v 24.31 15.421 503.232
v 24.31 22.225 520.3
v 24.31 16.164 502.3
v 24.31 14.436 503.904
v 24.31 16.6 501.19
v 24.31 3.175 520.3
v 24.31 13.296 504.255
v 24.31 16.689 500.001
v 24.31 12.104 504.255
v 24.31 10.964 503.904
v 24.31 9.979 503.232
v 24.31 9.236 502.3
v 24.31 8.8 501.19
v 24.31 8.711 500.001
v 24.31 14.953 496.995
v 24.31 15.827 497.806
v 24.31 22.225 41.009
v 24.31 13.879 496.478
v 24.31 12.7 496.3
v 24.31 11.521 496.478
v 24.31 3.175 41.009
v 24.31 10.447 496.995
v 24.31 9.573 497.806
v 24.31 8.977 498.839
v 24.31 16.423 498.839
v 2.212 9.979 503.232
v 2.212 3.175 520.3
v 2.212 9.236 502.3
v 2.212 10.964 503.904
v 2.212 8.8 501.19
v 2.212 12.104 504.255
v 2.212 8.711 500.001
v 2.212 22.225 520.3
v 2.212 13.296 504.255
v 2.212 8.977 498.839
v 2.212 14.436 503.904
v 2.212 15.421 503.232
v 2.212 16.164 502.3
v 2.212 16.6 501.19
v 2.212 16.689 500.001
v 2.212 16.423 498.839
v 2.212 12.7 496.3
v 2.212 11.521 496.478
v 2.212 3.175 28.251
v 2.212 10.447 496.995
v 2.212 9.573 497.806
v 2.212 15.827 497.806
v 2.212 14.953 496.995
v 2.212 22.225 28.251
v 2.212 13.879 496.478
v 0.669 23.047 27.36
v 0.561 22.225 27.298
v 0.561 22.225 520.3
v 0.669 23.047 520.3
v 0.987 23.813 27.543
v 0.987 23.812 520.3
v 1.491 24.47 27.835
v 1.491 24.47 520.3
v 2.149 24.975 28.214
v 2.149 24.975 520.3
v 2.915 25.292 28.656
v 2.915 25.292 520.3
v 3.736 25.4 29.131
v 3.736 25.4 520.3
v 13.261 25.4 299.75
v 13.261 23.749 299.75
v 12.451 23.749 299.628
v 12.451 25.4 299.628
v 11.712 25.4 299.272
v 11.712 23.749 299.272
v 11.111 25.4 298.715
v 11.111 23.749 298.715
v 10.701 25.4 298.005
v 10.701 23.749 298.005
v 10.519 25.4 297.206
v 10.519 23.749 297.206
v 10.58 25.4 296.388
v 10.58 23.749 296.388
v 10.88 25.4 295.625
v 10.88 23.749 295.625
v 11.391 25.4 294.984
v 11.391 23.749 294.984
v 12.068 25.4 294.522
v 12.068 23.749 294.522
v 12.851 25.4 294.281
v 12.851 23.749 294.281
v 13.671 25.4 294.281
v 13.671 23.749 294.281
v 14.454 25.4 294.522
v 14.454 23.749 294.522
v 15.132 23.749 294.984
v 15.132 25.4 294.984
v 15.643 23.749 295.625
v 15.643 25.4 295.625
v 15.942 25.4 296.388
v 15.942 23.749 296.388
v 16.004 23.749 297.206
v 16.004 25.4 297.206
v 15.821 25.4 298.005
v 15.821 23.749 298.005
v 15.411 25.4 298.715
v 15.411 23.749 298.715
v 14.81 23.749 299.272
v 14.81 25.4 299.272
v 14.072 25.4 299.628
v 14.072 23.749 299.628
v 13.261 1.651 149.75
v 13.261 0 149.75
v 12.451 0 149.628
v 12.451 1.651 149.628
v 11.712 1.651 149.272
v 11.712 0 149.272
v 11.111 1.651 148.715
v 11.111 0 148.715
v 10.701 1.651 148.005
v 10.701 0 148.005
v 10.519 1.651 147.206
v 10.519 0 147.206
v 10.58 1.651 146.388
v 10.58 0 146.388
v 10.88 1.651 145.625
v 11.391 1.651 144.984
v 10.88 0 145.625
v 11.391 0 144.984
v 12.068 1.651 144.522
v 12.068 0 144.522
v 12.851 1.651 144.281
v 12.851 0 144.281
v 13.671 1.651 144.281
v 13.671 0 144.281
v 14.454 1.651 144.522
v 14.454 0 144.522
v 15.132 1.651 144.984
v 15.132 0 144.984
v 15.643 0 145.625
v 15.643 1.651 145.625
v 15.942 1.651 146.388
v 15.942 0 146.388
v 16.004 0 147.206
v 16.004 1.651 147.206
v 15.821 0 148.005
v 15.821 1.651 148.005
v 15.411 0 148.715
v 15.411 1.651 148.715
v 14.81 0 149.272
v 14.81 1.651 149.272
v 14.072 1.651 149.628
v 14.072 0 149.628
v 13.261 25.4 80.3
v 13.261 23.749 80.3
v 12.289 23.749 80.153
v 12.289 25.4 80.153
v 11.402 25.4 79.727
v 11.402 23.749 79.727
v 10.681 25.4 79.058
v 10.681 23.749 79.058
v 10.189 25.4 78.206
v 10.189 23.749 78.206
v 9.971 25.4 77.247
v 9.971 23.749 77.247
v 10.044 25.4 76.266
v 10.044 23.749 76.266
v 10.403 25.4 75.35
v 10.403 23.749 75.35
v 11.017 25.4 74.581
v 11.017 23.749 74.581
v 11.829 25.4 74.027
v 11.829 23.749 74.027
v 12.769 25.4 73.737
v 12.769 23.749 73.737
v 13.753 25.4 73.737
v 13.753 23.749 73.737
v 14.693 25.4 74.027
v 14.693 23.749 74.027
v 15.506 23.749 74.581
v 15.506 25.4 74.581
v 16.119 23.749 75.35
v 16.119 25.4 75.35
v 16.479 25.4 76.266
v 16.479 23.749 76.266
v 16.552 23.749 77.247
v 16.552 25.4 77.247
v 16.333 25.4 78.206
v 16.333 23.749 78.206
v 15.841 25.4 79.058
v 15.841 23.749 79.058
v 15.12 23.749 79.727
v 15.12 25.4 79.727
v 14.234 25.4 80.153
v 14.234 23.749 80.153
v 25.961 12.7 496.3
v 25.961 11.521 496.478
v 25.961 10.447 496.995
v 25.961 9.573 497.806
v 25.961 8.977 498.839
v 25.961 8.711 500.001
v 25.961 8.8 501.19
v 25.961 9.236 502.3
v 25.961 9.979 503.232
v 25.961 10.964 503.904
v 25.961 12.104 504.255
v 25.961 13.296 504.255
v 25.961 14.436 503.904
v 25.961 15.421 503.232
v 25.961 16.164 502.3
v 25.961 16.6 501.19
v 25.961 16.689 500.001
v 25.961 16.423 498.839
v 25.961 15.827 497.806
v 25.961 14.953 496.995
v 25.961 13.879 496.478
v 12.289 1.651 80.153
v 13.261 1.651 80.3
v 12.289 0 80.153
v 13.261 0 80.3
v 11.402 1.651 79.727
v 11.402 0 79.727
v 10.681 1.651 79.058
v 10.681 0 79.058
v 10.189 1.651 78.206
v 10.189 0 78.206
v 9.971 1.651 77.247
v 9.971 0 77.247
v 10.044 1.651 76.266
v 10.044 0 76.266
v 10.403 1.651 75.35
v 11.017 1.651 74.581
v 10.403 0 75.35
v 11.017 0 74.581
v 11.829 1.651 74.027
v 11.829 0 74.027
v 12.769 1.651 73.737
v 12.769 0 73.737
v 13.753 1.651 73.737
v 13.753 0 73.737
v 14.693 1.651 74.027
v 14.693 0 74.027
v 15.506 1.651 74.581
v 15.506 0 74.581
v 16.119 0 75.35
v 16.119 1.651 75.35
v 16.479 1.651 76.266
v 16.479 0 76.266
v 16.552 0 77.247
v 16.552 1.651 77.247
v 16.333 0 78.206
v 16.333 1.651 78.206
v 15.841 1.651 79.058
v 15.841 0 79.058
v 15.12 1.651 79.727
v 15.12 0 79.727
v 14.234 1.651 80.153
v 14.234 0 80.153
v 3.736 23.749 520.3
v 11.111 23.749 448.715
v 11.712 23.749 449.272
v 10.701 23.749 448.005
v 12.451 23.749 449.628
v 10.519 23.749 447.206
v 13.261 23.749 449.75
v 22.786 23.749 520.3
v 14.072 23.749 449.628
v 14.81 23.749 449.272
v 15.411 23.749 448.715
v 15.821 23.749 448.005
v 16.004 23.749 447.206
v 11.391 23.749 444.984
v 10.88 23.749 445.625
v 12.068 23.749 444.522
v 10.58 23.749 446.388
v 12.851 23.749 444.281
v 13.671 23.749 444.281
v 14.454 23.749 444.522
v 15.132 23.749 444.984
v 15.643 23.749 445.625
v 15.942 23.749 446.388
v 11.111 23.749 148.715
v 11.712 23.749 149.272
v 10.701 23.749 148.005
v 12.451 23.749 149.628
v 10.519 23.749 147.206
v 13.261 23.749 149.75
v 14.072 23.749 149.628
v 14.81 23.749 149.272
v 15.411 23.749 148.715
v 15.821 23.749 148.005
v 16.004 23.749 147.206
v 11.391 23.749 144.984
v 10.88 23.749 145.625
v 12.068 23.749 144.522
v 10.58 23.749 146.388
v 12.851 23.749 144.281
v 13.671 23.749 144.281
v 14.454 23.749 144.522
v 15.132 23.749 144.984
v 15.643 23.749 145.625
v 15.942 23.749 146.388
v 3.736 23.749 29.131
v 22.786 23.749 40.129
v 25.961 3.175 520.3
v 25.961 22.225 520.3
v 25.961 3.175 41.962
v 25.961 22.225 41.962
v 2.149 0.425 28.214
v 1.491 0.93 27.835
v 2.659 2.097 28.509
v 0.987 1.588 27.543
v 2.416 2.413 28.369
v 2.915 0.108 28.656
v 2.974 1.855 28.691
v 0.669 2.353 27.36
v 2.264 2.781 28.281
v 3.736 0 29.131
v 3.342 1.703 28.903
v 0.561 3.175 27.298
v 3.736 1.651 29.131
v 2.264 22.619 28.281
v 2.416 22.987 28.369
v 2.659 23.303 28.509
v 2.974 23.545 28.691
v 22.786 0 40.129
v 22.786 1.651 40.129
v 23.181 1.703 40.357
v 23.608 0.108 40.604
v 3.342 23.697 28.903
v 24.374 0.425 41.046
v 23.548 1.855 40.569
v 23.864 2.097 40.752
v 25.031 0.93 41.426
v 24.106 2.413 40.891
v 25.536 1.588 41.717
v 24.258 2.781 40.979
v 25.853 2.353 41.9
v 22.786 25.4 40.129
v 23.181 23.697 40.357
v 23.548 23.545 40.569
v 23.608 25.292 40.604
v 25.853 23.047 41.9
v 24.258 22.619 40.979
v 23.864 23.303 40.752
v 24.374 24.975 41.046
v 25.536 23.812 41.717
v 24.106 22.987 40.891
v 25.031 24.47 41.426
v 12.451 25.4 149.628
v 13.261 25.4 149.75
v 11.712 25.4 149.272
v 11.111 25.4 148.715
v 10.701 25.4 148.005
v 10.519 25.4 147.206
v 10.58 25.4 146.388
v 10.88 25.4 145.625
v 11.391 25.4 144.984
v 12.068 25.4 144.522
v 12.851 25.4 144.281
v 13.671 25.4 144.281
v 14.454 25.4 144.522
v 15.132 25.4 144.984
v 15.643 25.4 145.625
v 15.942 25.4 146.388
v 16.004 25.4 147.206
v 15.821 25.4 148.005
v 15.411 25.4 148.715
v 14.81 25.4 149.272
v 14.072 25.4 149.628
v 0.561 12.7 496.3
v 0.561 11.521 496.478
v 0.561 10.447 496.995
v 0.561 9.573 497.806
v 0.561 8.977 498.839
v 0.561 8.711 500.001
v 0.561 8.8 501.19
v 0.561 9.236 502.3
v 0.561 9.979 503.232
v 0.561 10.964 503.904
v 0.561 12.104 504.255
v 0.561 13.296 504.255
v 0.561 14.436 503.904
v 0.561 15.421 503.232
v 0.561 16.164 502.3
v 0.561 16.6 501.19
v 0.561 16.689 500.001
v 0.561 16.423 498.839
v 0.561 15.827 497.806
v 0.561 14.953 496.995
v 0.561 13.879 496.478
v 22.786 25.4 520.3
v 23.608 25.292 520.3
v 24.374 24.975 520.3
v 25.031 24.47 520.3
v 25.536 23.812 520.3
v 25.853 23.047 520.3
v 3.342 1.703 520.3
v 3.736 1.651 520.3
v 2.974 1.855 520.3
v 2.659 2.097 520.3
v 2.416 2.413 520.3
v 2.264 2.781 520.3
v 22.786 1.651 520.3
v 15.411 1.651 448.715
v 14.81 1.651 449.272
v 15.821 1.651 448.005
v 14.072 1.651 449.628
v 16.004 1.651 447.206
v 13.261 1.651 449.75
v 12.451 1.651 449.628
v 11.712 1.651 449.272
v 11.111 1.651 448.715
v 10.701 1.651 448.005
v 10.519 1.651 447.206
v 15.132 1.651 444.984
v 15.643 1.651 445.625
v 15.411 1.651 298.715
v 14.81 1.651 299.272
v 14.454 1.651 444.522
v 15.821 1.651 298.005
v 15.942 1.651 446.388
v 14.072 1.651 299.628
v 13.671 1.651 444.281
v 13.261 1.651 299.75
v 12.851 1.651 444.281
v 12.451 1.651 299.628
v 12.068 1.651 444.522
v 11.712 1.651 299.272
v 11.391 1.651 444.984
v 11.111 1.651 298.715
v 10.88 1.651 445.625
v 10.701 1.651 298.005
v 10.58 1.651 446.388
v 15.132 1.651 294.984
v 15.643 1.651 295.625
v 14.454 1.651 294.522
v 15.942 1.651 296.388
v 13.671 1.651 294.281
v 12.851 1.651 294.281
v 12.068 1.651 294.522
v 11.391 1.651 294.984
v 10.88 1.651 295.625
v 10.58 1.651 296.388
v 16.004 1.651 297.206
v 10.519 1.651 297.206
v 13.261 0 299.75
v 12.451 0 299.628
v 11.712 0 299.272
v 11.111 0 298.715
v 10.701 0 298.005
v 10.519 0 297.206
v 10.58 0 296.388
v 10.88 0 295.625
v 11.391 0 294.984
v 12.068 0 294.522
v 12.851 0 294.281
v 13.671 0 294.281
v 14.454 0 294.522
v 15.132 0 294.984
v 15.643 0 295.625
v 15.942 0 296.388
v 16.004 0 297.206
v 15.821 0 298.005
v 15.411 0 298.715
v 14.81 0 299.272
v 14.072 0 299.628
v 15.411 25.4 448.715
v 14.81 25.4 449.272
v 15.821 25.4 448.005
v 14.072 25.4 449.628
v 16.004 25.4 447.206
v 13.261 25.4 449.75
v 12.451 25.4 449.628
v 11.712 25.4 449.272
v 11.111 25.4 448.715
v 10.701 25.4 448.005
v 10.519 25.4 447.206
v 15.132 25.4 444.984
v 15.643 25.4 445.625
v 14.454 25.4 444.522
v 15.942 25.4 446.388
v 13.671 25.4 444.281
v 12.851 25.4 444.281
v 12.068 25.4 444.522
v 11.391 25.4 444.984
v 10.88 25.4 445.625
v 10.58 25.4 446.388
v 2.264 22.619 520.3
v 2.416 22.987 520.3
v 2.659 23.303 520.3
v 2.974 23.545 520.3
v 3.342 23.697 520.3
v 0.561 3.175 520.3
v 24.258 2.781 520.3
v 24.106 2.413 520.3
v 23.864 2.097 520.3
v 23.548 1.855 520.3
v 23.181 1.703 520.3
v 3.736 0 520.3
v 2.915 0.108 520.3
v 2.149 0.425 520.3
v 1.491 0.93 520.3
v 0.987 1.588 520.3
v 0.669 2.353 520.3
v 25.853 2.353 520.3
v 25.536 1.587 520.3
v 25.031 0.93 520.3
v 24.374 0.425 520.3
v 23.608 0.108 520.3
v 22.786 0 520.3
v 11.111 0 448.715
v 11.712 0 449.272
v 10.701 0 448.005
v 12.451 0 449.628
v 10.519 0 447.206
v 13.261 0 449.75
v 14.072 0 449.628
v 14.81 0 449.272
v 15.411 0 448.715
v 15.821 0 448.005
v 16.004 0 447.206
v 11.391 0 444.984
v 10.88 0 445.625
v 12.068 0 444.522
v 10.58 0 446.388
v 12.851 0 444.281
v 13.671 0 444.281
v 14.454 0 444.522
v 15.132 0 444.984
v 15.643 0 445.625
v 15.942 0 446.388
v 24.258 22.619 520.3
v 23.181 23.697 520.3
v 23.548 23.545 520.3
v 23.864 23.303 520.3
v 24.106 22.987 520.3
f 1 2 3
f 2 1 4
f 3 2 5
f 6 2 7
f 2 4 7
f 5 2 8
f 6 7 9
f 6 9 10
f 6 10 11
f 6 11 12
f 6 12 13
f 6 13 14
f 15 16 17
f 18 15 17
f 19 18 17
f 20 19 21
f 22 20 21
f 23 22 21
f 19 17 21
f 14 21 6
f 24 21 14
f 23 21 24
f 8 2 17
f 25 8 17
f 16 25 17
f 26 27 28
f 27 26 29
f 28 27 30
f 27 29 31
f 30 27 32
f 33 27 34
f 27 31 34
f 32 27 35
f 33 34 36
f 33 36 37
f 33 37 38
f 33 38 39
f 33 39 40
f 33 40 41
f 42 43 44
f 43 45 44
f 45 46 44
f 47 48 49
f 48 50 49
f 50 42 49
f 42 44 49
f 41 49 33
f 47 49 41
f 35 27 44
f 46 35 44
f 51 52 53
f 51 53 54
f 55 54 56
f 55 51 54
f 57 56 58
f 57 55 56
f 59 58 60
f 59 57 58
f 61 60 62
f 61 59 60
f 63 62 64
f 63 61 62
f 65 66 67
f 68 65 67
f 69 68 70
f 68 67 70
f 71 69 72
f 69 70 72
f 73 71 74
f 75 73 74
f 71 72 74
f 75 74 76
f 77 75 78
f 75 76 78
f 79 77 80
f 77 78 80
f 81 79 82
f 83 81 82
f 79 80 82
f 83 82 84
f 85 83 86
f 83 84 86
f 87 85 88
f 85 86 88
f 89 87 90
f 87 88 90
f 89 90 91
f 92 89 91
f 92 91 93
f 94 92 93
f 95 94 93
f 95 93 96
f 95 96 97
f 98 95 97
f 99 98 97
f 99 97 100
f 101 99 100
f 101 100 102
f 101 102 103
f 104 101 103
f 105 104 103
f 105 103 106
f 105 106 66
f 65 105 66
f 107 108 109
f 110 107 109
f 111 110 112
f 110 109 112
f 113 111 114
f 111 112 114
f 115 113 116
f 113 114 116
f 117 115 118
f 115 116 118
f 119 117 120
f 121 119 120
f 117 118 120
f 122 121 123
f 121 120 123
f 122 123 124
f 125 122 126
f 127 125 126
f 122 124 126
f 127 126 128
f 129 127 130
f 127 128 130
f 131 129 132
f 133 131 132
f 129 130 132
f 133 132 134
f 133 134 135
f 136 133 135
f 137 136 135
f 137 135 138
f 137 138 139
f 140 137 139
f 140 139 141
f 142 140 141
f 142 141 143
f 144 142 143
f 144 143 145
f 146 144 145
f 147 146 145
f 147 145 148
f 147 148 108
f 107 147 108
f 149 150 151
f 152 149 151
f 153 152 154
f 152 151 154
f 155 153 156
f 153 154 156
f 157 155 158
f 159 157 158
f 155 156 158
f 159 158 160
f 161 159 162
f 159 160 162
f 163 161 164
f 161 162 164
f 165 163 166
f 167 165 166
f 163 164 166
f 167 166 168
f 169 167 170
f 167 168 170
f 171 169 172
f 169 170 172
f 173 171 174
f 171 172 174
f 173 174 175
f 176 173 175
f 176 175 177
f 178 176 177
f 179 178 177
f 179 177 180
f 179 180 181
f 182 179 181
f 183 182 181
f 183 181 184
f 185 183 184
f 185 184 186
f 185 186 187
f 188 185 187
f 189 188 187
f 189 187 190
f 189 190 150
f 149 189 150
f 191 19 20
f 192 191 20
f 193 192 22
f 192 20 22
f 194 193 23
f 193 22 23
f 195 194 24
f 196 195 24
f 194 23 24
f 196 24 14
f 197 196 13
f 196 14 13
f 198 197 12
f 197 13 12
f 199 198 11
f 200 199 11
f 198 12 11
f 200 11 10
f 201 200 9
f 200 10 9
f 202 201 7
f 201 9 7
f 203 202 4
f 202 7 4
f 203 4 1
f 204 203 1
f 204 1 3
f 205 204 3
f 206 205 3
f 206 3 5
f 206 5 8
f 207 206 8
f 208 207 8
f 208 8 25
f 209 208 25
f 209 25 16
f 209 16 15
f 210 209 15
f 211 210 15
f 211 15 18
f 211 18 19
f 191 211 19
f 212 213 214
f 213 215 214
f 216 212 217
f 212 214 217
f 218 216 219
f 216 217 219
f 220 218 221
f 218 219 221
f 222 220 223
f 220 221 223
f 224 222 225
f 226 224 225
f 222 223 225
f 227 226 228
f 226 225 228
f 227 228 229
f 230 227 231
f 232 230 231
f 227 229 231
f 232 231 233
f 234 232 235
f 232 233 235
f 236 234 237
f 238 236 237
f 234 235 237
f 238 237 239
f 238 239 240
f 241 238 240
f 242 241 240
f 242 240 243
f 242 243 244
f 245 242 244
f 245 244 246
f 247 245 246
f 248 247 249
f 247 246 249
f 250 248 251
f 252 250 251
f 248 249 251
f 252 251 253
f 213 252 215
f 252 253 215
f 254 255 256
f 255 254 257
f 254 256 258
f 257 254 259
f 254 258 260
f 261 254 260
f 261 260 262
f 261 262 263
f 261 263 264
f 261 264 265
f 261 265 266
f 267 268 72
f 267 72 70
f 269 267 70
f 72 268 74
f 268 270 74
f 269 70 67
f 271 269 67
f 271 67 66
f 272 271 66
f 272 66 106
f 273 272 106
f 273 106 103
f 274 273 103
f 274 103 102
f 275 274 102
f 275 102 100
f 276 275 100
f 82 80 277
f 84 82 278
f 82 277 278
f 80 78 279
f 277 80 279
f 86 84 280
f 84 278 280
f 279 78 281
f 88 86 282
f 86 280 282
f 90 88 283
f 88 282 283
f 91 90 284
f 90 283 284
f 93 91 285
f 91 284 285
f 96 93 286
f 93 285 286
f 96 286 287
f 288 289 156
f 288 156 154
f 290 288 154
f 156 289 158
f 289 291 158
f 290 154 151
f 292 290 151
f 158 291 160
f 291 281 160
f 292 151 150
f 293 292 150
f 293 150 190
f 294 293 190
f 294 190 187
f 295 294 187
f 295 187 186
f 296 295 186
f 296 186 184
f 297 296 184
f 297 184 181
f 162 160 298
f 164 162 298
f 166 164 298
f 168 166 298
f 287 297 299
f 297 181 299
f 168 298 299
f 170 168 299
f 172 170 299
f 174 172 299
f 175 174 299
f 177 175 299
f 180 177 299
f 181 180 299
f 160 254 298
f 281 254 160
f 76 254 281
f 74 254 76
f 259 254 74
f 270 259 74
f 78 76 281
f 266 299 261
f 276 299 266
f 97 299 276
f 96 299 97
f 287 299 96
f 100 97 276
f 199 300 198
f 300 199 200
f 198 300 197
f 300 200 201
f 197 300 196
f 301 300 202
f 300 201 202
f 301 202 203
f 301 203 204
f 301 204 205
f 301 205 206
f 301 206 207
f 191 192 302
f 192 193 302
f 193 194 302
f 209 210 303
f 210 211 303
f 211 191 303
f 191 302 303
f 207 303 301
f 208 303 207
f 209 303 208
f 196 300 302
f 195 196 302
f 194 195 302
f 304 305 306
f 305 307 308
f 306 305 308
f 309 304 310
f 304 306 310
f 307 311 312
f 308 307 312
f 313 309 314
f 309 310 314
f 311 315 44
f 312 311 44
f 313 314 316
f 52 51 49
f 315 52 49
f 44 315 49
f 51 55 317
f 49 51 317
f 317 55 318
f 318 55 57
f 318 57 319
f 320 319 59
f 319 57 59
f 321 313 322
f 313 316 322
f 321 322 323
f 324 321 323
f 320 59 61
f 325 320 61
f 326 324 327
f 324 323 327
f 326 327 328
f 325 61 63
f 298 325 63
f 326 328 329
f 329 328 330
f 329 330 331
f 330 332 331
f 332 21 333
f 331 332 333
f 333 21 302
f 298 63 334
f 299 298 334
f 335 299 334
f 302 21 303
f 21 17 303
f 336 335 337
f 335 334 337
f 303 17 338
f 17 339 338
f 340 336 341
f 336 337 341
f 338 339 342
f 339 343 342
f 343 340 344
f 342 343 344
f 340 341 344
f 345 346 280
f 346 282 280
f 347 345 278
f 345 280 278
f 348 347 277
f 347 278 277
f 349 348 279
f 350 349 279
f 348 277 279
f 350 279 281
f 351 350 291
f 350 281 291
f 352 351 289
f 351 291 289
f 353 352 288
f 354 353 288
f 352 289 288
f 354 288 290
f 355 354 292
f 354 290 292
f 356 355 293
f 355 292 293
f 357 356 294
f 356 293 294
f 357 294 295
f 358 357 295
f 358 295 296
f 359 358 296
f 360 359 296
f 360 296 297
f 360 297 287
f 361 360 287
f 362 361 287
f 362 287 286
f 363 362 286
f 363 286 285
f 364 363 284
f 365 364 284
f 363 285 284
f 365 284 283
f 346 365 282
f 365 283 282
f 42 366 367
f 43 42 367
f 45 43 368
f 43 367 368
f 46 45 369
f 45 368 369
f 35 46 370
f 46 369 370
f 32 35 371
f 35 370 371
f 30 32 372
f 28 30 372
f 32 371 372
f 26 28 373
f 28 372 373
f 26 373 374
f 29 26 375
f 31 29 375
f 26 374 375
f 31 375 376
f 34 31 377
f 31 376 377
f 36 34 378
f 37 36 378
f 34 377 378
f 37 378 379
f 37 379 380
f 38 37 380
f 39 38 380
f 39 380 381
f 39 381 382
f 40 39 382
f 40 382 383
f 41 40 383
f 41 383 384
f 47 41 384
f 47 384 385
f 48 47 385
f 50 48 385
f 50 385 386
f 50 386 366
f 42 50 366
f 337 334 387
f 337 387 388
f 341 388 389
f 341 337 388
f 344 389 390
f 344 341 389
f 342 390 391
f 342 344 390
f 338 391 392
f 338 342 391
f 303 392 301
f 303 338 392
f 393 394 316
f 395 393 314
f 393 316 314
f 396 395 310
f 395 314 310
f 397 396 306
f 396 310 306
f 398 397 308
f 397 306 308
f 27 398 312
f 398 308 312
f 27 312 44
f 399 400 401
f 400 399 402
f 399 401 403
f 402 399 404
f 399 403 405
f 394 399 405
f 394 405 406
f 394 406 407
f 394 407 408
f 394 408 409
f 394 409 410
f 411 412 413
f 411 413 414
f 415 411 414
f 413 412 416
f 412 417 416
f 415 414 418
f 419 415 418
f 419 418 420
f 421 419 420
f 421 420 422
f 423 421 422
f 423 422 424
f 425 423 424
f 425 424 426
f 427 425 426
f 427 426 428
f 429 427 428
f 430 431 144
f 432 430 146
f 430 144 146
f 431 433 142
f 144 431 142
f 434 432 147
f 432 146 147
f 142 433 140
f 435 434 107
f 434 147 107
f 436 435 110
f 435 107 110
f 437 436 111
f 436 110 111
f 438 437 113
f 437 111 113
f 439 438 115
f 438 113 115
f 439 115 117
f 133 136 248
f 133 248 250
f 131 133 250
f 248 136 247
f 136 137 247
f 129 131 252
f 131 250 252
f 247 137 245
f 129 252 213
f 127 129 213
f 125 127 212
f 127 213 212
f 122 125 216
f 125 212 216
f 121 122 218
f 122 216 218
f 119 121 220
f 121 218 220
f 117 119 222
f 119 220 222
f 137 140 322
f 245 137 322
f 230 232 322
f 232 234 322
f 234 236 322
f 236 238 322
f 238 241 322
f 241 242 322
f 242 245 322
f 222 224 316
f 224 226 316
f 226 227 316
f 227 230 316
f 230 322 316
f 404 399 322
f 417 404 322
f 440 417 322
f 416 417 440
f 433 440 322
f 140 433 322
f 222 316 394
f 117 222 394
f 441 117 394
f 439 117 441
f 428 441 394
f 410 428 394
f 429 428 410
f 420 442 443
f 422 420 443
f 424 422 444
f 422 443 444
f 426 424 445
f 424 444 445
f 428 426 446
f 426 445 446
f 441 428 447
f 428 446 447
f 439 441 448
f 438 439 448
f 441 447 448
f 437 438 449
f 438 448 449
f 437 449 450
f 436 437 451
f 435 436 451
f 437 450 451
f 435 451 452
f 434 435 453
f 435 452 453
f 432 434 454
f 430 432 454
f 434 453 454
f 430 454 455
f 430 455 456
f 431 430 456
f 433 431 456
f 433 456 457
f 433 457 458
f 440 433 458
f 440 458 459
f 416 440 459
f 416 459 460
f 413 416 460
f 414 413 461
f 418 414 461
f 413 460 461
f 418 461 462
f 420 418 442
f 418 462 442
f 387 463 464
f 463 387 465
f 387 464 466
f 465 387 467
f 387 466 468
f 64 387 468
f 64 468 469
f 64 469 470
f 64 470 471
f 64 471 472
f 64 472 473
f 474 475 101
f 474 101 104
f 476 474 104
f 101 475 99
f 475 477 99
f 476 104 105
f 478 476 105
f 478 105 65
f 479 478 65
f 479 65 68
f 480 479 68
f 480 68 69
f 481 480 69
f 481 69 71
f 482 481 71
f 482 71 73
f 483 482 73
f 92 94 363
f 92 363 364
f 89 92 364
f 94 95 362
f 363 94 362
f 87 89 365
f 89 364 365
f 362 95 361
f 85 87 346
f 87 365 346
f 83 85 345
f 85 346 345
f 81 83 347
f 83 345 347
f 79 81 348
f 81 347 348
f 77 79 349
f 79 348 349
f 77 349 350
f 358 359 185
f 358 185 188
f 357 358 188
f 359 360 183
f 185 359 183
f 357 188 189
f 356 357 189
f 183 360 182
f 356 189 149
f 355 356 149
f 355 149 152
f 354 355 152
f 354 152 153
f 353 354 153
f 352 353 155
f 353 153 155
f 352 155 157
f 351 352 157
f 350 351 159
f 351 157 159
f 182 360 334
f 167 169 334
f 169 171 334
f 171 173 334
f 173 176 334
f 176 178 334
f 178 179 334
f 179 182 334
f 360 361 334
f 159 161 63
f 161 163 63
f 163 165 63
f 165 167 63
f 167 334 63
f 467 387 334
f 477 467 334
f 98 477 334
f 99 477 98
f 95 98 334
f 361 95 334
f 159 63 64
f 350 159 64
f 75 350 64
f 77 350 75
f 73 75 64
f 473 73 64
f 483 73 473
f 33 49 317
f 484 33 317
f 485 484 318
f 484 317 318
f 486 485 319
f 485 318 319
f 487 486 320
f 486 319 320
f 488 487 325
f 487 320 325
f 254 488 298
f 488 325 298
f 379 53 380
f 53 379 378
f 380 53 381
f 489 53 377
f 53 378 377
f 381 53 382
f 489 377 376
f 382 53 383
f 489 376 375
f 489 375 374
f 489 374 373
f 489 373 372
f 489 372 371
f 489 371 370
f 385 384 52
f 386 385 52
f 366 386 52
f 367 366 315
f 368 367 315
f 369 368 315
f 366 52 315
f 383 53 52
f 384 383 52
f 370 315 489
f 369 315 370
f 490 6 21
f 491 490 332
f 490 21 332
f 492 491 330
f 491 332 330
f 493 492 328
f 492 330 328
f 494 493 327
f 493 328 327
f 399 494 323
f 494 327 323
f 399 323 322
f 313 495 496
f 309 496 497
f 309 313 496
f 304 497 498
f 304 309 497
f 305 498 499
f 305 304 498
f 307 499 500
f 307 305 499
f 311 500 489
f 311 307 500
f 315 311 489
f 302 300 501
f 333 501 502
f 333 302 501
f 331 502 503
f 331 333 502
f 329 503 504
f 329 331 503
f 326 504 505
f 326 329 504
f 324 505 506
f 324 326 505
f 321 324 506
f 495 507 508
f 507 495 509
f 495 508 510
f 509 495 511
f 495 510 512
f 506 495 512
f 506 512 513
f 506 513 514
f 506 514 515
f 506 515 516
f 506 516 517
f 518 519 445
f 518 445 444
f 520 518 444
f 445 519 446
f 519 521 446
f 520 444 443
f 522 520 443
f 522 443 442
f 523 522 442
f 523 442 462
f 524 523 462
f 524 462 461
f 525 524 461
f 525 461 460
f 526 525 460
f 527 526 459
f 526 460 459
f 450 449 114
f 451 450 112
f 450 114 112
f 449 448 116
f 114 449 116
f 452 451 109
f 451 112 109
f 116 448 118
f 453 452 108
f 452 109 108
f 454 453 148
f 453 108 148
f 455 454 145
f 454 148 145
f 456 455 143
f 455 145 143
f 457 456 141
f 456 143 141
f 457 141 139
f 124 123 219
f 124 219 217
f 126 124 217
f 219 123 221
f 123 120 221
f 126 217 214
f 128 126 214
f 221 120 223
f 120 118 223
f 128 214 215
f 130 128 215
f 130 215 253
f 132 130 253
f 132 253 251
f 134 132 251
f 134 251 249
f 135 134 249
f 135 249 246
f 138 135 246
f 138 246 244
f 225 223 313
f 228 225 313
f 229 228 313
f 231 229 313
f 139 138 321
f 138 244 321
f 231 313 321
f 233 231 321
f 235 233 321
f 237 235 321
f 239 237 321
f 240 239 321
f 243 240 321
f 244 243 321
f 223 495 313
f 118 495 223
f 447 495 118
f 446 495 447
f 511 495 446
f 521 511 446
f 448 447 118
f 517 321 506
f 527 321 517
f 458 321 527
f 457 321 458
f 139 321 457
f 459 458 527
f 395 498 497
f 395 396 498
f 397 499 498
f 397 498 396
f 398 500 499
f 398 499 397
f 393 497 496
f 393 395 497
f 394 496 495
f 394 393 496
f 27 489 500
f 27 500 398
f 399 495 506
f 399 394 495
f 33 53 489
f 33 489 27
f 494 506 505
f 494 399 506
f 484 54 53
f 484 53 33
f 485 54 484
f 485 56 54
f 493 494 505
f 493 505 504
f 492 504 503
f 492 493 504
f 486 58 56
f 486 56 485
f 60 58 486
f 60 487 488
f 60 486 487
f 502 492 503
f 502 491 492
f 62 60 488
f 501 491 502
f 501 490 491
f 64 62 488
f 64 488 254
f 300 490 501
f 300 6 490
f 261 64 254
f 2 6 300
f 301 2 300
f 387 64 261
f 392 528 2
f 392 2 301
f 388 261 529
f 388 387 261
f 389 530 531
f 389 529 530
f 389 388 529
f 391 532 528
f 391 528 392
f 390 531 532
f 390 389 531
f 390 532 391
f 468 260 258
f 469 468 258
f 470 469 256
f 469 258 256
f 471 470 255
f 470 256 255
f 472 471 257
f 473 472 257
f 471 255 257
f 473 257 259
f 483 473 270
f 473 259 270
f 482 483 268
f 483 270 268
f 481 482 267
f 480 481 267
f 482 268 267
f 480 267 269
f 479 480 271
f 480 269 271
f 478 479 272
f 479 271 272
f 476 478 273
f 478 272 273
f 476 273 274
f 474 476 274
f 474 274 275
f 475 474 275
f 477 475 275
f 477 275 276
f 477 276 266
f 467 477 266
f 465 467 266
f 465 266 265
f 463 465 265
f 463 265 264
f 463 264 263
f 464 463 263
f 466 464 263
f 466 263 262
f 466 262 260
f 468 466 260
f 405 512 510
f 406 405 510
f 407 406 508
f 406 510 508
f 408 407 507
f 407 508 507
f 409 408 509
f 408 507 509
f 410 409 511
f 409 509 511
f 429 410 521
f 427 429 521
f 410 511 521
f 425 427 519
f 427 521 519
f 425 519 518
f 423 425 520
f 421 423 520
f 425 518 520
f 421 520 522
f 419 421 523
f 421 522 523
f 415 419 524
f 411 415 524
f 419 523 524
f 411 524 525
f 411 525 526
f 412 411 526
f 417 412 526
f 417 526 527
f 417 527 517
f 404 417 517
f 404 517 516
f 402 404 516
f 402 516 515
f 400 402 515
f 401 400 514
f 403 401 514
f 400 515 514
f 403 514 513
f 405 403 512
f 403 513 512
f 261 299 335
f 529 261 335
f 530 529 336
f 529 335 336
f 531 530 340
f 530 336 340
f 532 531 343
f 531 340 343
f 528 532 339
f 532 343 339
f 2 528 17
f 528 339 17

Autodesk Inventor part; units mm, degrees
ref_plane "YZ Plane" through (0, 0, 0) normal (1, 0, 0) x (0, 1, 0)
ref_plane "XZ Plane" through (0, 0, 0) normal (0, 1, 0) x (-1, 0, 0)
ref_plane "XY Plane" through (0, 0, 0) normal (0, 0, 1) x (1, 0, 0)
sketch "Sketch1" plane through (0, 0, 0) normal (0, 0, 1) x (1, 0, 0)
  line L0 (3.7363, 0) -> (22.7863, 0)
  line L1 (25.9613, 3.175) -> (25.9613, 22.225)
  line L2 (22.7863, 25.4) -> (3.7363, 25.4)
  line L3 (0.5613, 22.225) -> (0.5613, 3.175)
  arc A0 (3.7363, 25.4) -> (0.5613, 22.225) centre (3.7363, 22.225) ccw
  arc A1 (0.5613, 3.175) -> (3.7363, 0) centre (3.7363, 3.175) ccw
  arc A2 (22.7863, 0) -> (25.9613, 3.175) centre (22.7863, 3.175) ccw
  arc A3 (25.9613, 22.225) -> (22.7863, 25.4) centre (22.7863, 22.225) ccw
  line L4 (3.7363, 23.749) -> (22.7863, 23.749)
  arc A4 (24.3103, 22.225) -> (22.7863, 23.749) centre (22.7863, 22.225) ccw
  line L5 (24.3103, 22.225) -> (24.3103, 3.175)
  arc A5 (22.7863, 1.651) -> (24.3103, 3.175) centre (22.7863, 3.175) ccw
  line L6 (22.7863, 1.651) -> (3.7363, 1.651)
  arc A6 (2.2123, 3.175) -> (3.7363, 1.651) centre (3.7363, 3.175) ccw
  line L7 (2.2123, 3.175) -> (2.2123, 22.225)
  arc A7 (3.7363, 23.749) -> (2.2123, 22.225) centre (3.7363, 22.225) ccw
  point P0 (0, 0)
  point P1 (0.5613, 0)
  point P2 (25.9613, 0)
  point P3 (0.5613, 25.4)
  dimension "d0" = 25.4
  dimension "d2" = 25.4
  dimension "d3" = 3.175
  dimension "d4" = 1.651
extrude "tube" add sketch "Sketch1" along normal blind 520.3
sketch "Sketch11" plane through (3.7363, 25.4, 0) normal (0, 1, 0) x (1, 0, 0)
  line L0 (19.05, 0) -> (0, 0) projected
  circle A0 centre (9.525, -20) radius 2.8743
  point P0 (-3.7363, 0)
  dimension "d83" = 20
hole "centerHole_cutOff" at (13.2613, 25.4, 20) direction (0, -1, 0) diameter 6.35 end through all
sketch "Sketch12" plane through (3.7363, 25.4, 0) normal (0, 1, 0) x (1, 0, 0)
  circle A0 centre (9.525, -20) radius 3.175 projected
  circle A1 centre (9.525, -77) radius 2.5235
  point P0 (-3.7363, 0)
  dimension "d91" = 57
hole "collarHole" at (13.2613, 25.4, 77) direction (0, -1, 0) diameter 6.6 end through all clearance for "Hex Head Bolt" size "M6" standard "Ansi Metric M Profile"
sketch "Sketch8" plane through (3.7363, 25.4, 520.3) normal (0, 1, 0) x (1, 0, 0)
  line L0 (0, 520.3) -> (0, 0) projected
  circle A0 centre (9.525, 73.3) radius 1.5875
  circle A1 centre (9.525, 223.3) radius 1.5875
  circle A2 centre (9.525, 373.3) radius 1.5875
  circle A3 centre (9.525, 500.3) radius 3.175 projected
  point P0 (0, 518.1689)
  point P1 (-3.7363, 520.3)
  dimension "d43" = 3.175
  dimension "d47" = 150
  dimension "d99" = 127
hole "armAttach" at (13.2613, 25.4, 447) at (13.2613, 25.4, 297) at (13.2613, 25.4, 147) direction (0, -1, 0) diameter 5.5 end through all
sketch "Sketch6" plane through (25.9613, 3.175, 520.3) normal (1, 0, 0) x (0, 0, -1)
  line L0 (0, 0) -> (0, 19.05) projected
  circle A0 centre (20, 9.525) radius 2.9685
  point P0 (520.3, -3.175)
  dimension "d27" = 20
hole "ropeAttach" at (25.9613, 12.7, 500.3) direction (-1, 0, 0) diameter 8 end through all
sketch "Sketch13" plane through (3.7363, 25.4, 0) normal (0, 1, 0) x (1, 0, 0)
  circle A0 centre (9.525, -20) radius 3.175 projected
  line L0 (9.525, -20) -> (9.525, -34.6812) construction
  line L1 (-12.9518, -21.6531) -> (31.0422, -47.0531)
  line L2 (0, -34.6812) -> (50.8, -34.6812) construction
  line L3 (-12.9518, 4.6365) -> (31.0422, 4.6365)
  line L4 (31.0422, -47.0531) -> (31.0422, 4.6365)
  line L5 (-12.9518, 4.6365) -> (-12.9518, -21.6531)
  point P0 (-3.7363, 0)
  dimension "d100" = 14.6812
  dimension "d101" = 50.8
  dimension "d102" = 30
extrude "angledEnd" cut sketch "Sketch13" against normal blind 50.8
equation "\"d0\" = tube"
equation "\"d2\" = tube"
equation "\"tube\" = 25.4"
properties part number "2f2ax1" material "Steel"
